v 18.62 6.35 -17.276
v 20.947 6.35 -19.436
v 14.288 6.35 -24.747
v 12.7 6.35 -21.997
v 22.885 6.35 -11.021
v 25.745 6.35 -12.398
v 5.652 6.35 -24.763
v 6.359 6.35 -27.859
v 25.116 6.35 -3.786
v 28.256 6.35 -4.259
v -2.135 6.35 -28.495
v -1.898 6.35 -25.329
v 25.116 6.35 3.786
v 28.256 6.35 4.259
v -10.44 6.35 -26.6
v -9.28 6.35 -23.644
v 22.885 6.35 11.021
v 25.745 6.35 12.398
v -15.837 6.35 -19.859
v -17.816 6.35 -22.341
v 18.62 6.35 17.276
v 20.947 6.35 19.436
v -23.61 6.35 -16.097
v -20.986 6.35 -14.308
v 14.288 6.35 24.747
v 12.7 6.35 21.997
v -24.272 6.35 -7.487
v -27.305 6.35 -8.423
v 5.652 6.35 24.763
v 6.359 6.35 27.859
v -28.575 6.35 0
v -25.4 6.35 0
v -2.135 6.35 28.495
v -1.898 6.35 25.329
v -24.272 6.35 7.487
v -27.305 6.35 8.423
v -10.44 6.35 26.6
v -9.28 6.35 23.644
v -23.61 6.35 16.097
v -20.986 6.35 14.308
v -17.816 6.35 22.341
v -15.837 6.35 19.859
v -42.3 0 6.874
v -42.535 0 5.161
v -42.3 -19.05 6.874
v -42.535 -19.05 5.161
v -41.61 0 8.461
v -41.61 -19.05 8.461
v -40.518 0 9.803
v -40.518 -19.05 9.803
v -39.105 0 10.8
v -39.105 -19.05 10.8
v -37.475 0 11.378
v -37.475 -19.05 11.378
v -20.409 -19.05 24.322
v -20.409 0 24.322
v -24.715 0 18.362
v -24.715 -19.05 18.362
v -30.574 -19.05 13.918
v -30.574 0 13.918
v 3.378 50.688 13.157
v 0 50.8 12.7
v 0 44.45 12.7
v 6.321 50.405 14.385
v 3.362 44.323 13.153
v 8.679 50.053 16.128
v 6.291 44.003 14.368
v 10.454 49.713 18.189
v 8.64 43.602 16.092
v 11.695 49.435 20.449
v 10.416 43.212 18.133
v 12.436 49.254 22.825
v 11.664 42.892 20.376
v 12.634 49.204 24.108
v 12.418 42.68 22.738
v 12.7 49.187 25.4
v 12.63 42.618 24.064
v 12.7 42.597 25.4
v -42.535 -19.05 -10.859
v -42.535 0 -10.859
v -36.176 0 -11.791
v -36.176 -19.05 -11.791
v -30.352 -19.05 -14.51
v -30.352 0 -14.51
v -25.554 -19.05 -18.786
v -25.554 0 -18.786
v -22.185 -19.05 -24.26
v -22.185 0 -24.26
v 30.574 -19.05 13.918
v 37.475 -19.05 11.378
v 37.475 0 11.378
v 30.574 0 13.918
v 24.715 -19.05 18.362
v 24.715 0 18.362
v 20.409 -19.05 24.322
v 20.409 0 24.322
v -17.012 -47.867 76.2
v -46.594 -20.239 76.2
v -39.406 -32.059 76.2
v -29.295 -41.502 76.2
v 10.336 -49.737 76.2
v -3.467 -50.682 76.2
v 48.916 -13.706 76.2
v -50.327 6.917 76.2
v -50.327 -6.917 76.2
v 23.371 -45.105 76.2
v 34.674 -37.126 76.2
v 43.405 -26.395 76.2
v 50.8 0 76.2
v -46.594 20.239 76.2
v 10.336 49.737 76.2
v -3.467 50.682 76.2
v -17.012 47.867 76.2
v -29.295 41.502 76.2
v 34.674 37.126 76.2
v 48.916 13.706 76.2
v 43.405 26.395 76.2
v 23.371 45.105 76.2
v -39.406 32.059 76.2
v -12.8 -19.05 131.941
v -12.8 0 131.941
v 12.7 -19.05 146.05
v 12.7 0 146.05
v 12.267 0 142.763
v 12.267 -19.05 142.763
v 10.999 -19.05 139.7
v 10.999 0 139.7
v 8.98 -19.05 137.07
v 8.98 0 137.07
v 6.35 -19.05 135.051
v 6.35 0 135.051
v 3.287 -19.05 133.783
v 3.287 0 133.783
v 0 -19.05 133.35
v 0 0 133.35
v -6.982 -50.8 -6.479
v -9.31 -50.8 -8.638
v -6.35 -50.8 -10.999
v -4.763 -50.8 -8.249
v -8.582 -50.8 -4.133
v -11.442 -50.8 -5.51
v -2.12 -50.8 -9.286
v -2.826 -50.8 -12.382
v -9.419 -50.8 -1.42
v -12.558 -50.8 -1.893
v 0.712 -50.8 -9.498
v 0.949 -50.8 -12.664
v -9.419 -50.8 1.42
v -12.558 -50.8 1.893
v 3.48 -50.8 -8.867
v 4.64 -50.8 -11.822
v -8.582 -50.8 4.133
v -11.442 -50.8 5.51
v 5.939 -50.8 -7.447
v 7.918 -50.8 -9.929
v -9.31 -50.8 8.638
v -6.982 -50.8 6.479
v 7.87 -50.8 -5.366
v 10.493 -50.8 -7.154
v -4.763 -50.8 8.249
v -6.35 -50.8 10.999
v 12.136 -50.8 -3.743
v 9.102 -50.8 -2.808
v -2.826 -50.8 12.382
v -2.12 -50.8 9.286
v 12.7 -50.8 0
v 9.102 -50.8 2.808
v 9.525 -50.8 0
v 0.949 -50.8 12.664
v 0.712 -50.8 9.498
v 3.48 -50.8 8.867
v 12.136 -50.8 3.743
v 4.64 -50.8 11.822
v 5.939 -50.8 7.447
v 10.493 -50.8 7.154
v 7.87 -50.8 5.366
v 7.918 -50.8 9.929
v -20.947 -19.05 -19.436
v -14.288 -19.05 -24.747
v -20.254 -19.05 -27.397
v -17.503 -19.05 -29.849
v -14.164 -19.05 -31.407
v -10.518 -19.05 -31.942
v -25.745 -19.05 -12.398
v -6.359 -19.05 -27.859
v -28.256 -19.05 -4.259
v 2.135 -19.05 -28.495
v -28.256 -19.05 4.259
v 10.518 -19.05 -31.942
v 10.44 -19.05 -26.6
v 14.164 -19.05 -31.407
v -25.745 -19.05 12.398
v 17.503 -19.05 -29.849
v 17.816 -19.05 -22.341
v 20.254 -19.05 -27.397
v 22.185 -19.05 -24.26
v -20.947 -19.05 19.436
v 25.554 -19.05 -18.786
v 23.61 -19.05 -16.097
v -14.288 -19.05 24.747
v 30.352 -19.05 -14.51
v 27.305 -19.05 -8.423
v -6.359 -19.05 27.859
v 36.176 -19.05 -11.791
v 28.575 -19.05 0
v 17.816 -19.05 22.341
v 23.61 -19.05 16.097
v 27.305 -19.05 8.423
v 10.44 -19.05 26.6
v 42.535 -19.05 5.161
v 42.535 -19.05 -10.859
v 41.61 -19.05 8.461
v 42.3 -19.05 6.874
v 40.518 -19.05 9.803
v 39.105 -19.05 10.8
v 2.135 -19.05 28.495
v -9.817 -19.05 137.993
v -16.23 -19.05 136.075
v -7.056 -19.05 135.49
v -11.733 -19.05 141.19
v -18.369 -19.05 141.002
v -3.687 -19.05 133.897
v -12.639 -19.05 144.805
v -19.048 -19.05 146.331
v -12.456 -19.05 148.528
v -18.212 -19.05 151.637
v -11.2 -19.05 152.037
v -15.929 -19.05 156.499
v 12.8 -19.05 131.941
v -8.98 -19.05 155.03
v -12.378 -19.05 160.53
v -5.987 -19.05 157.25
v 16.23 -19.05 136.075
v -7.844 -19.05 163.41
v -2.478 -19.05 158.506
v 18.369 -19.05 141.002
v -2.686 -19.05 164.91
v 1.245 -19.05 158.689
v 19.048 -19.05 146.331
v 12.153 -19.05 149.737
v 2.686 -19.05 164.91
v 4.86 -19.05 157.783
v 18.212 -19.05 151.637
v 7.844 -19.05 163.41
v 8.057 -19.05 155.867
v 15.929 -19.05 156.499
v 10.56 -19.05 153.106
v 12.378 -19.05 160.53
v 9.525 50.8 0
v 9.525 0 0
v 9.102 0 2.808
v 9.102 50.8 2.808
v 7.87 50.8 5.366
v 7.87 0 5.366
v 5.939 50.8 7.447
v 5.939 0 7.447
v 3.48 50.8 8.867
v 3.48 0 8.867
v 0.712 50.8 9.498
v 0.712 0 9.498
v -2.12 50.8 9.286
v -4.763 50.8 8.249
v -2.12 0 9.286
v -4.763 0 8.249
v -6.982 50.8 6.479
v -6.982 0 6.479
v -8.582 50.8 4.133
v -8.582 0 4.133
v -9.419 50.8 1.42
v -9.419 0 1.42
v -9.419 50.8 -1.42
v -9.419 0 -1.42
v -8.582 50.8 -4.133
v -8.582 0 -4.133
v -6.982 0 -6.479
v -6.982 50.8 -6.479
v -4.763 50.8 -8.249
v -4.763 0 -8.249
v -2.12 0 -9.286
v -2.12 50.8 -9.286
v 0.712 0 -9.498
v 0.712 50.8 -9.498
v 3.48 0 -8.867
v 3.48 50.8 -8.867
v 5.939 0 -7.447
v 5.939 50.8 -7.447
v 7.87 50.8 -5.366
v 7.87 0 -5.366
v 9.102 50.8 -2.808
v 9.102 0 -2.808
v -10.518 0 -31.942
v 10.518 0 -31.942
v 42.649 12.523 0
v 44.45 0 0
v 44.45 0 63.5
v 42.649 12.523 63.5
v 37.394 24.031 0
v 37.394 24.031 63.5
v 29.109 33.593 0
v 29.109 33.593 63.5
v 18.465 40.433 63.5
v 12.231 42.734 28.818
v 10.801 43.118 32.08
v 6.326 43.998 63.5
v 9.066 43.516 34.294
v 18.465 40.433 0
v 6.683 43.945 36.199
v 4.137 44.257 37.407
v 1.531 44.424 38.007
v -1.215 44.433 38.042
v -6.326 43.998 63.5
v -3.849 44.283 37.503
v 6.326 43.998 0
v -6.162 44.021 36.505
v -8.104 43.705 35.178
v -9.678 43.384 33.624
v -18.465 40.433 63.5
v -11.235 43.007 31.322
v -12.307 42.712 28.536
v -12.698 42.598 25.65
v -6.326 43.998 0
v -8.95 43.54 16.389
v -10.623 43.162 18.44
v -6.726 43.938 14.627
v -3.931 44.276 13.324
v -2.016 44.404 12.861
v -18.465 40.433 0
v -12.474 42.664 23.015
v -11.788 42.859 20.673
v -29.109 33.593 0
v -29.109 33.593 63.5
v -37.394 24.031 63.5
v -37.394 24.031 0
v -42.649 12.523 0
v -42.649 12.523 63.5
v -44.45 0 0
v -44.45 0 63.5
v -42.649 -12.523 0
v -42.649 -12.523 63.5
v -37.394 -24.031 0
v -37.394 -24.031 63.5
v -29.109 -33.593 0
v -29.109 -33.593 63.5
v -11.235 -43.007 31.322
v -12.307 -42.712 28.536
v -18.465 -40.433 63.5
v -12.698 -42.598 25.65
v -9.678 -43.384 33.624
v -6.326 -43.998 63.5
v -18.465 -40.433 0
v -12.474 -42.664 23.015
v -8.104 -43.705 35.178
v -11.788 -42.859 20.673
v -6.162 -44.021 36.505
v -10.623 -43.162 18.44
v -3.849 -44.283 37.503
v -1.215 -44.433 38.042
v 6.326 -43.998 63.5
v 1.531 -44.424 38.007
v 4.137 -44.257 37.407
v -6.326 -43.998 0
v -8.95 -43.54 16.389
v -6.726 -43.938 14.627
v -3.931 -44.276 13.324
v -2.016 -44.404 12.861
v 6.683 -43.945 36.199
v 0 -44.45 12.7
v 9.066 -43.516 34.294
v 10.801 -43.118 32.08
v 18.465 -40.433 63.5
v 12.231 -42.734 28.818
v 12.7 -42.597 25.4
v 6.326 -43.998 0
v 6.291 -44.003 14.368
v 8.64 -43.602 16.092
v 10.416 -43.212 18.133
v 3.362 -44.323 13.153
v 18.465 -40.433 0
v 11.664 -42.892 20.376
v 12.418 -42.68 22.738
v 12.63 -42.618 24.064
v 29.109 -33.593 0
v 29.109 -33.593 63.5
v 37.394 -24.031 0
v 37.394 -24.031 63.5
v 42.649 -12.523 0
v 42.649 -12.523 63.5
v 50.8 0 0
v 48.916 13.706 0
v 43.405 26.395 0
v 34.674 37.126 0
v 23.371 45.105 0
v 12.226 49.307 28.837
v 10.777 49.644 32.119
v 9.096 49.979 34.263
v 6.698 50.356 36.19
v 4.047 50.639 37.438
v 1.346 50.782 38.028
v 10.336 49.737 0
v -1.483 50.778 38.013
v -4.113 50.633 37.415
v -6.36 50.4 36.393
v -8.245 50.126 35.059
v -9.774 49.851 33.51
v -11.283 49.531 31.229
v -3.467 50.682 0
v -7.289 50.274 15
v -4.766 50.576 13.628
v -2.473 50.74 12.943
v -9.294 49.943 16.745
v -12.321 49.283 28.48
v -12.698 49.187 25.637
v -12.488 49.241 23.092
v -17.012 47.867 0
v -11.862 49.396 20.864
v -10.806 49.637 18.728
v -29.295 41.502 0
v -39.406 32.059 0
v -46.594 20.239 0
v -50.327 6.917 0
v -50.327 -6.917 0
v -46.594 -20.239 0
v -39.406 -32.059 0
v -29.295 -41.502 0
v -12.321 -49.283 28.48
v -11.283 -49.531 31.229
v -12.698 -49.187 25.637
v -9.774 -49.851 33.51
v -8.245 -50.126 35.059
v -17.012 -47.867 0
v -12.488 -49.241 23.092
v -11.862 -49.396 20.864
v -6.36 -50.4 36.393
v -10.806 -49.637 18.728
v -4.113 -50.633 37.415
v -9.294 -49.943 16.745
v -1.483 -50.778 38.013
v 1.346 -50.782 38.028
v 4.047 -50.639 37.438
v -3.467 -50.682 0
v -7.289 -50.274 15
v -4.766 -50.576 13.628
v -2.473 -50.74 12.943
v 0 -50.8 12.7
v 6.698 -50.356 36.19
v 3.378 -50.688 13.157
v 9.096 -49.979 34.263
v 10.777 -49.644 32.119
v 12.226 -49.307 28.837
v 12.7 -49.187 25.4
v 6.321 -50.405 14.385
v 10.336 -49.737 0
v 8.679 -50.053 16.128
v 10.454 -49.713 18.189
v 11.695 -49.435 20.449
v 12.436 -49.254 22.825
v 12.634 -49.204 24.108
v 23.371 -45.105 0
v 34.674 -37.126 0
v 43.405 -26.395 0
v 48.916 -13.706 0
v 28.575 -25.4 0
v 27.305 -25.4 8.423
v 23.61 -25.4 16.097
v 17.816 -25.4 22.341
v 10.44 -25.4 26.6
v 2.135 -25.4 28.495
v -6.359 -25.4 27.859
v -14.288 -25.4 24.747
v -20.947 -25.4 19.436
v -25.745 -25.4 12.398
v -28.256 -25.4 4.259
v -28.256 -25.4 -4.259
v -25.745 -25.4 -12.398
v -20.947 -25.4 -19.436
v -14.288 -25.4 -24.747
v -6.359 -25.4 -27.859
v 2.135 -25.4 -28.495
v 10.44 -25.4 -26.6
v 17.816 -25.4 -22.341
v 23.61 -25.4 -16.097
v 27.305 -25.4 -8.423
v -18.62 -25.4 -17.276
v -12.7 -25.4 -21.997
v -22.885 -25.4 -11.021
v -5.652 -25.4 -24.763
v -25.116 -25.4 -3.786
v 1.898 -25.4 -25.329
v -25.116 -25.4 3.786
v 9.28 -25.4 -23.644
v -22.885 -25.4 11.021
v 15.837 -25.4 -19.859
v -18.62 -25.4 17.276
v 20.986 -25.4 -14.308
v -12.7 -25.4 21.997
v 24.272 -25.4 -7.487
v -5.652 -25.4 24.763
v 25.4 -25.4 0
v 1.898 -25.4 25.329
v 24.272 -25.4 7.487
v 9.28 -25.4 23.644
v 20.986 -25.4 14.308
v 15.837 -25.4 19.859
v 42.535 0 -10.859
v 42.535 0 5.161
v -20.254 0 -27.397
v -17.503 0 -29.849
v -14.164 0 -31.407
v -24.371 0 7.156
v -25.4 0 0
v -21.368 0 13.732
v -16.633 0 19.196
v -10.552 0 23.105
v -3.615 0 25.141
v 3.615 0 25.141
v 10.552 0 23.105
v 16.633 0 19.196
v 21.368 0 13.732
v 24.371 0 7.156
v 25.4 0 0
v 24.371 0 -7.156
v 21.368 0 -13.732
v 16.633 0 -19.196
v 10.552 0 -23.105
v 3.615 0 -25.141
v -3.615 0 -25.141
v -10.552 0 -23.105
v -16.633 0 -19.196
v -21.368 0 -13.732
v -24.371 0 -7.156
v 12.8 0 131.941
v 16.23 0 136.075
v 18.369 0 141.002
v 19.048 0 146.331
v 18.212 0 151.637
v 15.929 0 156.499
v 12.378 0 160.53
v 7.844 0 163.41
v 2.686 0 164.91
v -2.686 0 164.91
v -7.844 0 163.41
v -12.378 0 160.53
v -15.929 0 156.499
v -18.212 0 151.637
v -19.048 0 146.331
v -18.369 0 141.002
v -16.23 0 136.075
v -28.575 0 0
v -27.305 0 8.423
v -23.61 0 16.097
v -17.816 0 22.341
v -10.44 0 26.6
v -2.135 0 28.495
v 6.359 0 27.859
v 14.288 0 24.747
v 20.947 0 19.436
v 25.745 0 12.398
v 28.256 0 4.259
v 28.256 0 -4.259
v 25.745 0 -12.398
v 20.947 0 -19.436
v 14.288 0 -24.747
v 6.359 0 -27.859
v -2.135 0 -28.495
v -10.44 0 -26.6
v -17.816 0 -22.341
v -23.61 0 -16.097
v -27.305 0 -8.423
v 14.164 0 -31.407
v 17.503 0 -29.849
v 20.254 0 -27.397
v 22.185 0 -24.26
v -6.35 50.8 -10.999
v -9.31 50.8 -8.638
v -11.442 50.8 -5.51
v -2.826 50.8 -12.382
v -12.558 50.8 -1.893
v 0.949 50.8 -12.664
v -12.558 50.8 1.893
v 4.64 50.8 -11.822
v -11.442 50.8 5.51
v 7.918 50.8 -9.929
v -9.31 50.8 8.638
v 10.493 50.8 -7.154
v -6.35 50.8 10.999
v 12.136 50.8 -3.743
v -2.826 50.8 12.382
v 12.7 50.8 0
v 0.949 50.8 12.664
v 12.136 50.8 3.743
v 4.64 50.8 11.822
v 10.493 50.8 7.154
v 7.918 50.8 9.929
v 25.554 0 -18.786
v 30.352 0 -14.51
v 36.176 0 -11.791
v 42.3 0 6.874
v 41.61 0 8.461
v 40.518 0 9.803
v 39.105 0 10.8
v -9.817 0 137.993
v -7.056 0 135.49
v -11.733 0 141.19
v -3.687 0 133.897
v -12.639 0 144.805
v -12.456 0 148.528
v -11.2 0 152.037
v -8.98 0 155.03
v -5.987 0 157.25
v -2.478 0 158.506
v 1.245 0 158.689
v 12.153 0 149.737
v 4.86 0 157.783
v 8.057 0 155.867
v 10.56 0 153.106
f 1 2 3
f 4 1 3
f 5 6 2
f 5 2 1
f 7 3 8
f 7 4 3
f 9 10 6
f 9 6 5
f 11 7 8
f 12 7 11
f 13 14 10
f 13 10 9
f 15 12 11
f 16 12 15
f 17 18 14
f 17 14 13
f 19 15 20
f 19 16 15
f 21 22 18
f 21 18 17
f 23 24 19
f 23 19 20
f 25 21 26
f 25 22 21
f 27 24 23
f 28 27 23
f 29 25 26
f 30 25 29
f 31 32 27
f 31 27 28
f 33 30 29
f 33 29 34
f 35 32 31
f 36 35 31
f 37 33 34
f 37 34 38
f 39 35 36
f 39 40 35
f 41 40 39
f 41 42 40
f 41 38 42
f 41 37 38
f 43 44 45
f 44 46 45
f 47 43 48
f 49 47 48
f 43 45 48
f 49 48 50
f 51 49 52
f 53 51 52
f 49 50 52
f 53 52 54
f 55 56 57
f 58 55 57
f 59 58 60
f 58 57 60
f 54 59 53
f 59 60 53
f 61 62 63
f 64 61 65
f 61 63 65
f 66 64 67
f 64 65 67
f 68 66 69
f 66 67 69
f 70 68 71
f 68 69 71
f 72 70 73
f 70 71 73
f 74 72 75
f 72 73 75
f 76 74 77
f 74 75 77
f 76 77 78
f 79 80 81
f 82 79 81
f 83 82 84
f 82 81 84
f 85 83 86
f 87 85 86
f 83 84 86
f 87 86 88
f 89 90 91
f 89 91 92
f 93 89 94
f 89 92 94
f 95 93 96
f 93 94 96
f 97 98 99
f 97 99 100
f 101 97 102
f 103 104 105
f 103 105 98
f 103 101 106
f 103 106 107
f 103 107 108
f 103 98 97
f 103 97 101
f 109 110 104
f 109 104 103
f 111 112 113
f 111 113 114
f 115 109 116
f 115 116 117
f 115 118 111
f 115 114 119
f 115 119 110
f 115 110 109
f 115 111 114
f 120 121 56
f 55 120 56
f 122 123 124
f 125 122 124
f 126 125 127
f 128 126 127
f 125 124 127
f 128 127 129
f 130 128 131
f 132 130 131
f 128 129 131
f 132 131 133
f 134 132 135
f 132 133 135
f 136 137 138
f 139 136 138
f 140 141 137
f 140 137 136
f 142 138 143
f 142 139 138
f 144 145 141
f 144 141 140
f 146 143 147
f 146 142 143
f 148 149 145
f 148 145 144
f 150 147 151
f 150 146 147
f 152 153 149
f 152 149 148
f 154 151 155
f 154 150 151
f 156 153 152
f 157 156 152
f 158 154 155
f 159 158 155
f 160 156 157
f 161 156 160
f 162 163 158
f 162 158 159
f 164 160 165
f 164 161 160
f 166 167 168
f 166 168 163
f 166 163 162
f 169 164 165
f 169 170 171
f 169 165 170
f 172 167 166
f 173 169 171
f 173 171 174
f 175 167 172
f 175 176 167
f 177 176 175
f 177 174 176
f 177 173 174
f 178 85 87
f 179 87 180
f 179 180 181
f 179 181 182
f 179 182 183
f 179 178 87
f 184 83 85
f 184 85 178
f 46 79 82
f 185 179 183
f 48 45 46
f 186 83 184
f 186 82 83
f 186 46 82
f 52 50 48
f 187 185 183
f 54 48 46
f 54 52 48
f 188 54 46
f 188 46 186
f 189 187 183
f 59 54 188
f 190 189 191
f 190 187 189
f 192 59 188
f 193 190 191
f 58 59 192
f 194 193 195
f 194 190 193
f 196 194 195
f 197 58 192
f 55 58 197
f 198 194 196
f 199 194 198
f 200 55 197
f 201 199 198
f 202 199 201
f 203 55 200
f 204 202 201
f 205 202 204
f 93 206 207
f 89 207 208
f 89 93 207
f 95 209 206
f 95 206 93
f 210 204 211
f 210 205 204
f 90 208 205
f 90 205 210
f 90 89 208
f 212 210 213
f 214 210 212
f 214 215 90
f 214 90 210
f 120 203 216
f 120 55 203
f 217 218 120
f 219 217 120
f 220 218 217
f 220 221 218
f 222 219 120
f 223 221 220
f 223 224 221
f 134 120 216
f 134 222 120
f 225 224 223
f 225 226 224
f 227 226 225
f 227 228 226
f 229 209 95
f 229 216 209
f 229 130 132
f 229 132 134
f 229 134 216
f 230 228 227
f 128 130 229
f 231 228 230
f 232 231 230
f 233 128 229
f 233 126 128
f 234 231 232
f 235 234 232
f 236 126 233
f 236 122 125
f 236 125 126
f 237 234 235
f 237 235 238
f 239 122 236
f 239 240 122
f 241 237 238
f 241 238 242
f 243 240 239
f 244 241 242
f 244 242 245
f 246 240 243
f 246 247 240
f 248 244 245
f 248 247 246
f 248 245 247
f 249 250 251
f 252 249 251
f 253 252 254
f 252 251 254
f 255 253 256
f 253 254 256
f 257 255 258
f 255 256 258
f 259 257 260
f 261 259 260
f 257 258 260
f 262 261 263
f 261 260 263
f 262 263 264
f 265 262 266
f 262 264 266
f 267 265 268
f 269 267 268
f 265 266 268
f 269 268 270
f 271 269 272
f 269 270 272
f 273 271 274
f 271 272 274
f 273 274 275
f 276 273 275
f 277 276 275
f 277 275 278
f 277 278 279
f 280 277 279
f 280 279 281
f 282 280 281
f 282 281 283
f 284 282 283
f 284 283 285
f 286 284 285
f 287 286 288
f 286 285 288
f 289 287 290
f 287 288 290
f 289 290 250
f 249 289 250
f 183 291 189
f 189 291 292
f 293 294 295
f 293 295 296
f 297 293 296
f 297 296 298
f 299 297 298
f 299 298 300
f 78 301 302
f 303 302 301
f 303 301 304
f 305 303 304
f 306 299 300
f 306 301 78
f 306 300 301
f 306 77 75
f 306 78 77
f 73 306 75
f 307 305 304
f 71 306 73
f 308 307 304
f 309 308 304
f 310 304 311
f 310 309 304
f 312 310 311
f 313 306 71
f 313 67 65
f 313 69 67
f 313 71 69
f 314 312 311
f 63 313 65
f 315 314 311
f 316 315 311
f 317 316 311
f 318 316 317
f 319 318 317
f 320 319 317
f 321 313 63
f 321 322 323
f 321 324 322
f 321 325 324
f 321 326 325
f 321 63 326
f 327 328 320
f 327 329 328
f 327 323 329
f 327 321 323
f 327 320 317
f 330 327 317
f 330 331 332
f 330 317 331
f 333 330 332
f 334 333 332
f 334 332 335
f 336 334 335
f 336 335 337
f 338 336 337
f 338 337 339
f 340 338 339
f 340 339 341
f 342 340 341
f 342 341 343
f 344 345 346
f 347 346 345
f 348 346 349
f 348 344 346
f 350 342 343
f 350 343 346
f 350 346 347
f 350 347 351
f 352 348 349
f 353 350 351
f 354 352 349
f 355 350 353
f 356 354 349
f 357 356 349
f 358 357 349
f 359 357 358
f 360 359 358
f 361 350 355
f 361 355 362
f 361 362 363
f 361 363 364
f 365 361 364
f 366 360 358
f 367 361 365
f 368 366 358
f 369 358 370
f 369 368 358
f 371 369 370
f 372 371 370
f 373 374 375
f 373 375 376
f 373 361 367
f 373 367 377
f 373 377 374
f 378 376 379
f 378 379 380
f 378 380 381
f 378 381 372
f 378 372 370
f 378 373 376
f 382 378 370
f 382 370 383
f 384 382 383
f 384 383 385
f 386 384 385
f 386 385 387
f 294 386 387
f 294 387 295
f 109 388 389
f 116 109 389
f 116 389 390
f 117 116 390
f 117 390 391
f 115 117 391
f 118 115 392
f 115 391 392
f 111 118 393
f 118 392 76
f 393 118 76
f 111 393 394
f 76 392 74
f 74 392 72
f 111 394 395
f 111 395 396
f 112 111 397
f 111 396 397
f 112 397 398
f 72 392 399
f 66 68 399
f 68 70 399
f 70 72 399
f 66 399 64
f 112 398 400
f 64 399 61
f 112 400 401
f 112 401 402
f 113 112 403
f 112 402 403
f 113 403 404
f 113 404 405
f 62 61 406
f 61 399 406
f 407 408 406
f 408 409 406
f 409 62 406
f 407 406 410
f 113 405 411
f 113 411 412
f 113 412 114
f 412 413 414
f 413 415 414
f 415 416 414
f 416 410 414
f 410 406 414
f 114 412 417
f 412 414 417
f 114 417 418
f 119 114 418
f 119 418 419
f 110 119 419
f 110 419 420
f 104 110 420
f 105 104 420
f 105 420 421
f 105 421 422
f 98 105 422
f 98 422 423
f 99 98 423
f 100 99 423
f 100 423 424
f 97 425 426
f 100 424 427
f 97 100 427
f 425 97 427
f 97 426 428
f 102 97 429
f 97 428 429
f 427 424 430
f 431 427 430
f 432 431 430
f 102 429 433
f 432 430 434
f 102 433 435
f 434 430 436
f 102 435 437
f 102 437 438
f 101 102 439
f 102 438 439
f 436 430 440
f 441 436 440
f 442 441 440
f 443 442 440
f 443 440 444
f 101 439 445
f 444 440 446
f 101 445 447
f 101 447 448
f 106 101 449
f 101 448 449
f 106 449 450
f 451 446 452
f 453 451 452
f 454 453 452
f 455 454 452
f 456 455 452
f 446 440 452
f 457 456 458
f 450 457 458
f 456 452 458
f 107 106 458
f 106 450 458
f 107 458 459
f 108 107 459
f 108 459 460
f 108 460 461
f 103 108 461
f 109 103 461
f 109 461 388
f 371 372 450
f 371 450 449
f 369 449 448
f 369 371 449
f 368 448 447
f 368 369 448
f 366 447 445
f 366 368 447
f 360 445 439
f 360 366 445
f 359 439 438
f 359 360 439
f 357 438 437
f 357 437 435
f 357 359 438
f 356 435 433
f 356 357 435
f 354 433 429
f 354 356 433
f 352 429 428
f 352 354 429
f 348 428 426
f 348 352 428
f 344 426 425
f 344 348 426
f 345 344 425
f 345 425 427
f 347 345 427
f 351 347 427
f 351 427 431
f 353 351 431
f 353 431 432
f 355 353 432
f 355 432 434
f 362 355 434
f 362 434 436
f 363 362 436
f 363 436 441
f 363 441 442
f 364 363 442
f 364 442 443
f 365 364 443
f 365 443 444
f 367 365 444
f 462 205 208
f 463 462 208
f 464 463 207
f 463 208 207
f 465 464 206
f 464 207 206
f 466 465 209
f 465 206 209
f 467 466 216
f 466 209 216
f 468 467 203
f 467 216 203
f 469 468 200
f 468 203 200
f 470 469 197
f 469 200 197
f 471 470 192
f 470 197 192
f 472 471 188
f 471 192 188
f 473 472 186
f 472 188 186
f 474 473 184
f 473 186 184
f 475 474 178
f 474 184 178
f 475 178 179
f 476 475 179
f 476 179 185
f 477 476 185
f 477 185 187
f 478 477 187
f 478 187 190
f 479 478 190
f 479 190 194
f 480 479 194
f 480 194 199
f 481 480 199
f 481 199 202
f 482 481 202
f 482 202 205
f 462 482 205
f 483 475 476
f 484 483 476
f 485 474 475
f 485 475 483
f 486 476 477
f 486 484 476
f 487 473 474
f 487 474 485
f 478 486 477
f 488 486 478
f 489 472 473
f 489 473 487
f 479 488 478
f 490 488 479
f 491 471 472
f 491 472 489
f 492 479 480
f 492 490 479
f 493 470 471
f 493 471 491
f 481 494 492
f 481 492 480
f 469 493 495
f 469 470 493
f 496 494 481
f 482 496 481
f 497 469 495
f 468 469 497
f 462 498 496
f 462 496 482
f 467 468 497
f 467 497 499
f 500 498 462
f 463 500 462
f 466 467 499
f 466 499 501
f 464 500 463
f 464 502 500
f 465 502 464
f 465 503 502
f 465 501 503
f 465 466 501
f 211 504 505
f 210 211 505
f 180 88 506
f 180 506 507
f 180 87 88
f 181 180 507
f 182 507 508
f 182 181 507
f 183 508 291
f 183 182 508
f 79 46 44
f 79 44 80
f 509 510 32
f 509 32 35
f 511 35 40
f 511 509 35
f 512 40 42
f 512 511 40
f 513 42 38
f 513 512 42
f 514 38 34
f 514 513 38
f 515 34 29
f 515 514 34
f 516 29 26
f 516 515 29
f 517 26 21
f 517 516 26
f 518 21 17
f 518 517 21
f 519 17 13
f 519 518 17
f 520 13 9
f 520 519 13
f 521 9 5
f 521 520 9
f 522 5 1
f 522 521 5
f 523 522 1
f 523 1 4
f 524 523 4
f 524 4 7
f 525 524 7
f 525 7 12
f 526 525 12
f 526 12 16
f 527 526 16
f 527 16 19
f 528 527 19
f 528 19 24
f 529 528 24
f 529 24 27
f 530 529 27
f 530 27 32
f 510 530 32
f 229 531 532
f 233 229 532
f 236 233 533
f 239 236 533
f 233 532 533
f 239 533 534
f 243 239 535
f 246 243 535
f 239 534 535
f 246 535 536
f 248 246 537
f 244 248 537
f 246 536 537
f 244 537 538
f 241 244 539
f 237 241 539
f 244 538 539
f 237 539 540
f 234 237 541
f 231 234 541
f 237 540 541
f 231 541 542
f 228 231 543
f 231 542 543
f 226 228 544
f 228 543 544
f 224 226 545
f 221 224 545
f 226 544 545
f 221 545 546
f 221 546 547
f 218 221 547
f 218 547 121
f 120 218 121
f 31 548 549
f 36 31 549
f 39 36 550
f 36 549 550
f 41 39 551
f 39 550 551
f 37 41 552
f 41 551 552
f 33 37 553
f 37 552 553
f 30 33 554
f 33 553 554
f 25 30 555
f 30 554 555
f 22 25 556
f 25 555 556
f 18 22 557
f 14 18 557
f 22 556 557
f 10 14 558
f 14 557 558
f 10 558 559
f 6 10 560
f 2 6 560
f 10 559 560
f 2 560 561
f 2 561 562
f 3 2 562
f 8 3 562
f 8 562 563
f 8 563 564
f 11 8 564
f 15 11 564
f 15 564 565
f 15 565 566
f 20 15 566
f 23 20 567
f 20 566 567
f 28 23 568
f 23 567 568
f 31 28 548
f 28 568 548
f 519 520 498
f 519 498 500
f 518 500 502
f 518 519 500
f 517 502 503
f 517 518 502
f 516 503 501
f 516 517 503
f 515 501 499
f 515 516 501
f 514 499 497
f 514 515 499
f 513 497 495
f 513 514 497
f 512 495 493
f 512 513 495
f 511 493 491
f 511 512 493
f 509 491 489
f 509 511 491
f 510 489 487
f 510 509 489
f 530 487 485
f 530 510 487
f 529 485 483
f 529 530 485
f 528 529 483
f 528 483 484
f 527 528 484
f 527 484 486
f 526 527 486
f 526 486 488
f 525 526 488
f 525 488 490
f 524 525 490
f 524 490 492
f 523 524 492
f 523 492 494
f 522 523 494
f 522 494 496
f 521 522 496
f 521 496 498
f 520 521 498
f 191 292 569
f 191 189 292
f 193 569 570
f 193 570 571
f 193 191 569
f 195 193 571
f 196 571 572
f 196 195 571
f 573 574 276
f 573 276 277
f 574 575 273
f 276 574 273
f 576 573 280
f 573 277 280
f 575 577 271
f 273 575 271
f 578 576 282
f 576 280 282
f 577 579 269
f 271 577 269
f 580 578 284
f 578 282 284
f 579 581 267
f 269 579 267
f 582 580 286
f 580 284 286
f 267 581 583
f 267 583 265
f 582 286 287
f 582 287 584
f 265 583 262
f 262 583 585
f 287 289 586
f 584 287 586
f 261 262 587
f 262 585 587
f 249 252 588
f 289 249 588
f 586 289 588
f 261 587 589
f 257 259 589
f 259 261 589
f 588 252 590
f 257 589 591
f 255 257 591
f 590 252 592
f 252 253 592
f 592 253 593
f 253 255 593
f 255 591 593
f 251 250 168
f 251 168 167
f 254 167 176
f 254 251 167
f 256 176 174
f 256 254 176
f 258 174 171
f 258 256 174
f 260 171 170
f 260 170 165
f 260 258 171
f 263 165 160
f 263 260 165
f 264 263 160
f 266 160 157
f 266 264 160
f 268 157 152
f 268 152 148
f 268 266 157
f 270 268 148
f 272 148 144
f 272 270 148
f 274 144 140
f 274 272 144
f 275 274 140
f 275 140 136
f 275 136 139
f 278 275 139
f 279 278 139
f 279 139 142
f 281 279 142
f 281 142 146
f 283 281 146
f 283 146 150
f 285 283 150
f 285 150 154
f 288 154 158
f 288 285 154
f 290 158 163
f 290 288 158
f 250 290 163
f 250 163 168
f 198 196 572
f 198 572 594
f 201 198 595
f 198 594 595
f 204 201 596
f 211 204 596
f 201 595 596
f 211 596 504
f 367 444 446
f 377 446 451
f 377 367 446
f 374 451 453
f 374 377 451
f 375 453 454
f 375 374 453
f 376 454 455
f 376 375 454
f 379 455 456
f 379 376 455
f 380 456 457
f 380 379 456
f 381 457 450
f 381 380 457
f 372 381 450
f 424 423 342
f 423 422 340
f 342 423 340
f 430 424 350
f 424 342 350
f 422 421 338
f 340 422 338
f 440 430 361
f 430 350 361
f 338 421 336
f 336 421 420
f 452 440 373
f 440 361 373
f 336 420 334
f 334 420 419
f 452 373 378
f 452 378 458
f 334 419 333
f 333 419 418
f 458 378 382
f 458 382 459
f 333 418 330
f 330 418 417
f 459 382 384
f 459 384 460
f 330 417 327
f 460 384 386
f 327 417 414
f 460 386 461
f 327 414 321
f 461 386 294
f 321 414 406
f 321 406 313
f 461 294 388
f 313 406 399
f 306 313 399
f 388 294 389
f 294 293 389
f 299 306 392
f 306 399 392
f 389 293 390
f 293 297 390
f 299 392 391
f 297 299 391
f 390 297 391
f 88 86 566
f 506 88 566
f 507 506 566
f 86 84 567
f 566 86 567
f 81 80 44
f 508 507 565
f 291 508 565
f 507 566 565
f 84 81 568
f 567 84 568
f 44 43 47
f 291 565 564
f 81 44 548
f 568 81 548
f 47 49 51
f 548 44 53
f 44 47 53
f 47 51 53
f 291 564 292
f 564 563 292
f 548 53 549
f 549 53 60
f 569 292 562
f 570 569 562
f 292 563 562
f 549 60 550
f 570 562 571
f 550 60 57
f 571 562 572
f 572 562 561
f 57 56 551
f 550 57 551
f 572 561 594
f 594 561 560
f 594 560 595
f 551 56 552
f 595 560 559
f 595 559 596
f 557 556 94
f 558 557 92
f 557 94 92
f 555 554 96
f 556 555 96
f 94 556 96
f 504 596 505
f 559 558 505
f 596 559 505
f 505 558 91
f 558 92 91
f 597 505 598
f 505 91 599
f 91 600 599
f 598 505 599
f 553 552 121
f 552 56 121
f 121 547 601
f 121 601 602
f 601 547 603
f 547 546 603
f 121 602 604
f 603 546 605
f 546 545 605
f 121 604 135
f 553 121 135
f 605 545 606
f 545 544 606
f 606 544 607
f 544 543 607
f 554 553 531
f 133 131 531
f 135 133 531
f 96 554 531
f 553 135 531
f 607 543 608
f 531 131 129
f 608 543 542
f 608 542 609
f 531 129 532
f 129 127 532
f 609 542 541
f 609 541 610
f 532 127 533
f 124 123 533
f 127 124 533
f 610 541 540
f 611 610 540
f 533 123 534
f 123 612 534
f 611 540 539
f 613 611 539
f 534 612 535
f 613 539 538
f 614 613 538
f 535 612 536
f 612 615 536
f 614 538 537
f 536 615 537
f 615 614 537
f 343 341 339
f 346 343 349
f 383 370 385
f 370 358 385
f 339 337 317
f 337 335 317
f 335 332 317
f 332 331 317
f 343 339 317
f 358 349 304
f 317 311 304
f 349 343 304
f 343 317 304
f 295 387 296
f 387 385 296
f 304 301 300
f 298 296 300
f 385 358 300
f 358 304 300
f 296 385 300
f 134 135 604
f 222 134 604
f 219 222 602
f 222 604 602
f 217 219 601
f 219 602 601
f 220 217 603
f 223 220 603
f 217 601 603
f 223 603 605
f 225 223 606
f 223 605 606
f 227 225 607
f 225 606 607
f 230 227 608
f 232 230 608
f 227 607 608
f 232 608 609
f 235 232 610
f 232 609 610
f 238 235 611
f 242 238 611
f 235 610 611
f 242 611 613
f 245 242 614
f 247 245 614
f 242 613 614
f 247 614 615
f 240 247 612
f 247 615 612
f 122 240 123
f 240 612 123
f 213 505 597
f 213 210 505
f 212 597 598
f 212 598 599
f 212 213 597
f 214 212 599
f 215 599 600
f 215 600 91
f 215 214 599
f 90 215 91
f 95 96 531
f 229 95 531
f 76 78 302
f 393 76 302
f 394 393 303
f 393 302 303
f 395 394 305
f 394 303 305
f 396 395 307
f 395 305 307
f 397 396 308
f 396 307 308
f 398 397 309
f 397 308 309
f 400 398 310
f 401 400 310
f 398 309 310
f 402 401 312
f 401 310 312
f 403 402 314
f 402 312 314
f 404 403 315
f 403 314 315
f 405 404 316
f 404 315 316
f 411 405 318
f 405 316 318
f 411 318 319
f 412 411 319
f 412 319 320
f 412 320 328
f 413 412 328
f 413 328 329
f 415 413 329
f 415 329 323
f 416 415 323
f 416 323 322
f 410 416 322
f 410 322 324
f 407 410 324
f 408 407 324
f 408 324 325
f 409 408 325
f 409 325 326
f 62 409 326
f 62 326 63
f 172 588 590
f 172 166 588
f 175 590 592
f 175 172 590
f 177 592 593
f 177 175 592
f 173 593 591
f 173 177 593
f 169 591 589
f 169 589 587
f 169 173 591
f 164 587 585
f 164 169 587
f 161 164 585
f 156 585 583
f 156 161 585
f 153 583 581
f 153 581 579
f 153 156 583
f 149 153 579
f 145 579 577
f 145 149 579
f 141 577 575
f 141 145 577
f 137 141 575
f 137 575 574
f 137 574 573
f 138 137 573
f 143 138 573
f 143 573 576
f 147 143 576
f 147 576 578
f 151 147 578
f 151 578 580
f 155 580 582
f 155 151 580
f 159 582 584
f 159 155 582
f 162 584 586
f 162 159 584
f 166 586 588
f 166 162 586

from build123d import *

# Parameters (mm, degrees)
F1_DEPTH       = 19.05
F2_R           = 28.575
F2_R_2         = 25.4
F3_DEPTH       = 25.4
F4_R           = 28.575
F4_R_2         = 25.4
F5_DEPTH       = 6.35
F6_R           = 12.7
F7_R           = 6.35
F8_R           = 12.7
F8_R_2         = 9.525
F9_DEPTH       = 50.8
F9_DEPTH_BACK  = 50.8
F10_R          = 50.8
F10_R_2        = 44.45
F11_DEPTH      = 76.2
F12_R          = 50.8
F13_DEPTH      = 12.7
F15_DEPTH      = 72.136
F15_DEPTH_BACK = 101.346


with BuildPart() as f1:
    # F0 (on Front) → F1 (new body)
    with BuildSketch(Plane.XZ):
        with BuildLine():
            Line((-12.7996388564, 131.9407213102), (-20.4085066075, 24.321911069))
            ThreePointArc((-20.4085066075, 24.321911069), (-29.5849648539, 14.4892969079), (-42.53524071, 10.8591395506))
            Line((-42.53524071, 10.8591395506), (-42.53524071, -10.8591395506))
            ThreePointArc((-42.53524071, -10.8591395506), (-27.2539153671, -16.9737049796), (-20.4085066075, -31.941911069))
            Line((-20.4085066075, -31.941911069), (20.4085066075, -31.941911069))
            ThreePointArc((20.4085066075, -31.941911069), (27.2539153671, -16.9737049796), (42.53524071, -10.8591395506))
            Line((42.53524071, -10.8591395506), (42.53524071, 10.8591395506))
            ThreePointArc((42.53524071, 10.8591395506), (29.5849648539, 14.4892969079), (20.4085066075, 24.321911069))
            Line((20.4085066075, 24.321911069), (12.7996388564, 131.9407213102))
            ThreePointArc((12.7996388564, 131.9407213102), (0, 165.1), (-12.7996388564, 131.9407213102))
        make_face()
        with BuildLine():
            ThreePointArc((0, -28.575), (-20.2055762724, 20.2055762724), (28.575, 0))
            ThreePointArc((28.575, 0), (20.2055762724, -20.2055762724), (0, -28.575))
        make_face(mode=Mode.SUBTRACT)
        with BuildLine():
            ThreePointArc((0, 133.35), (-8.9802561211, 155.0302561211), (12.7, 146.05))
            ThreePointArc((12.7, 146.05), (8.9802561211, 137.0697438789), (0, 133.35))
        make_face(mode=Mode.SUBTRACT)
    extrude(amount=F1_DEPTH)

    # F2 (on Front) → F3 (join)
    with BuildSketch(Plane.XZ):
        Circle(F2_R)
        Circle(F2_R_2, mode=Mode.SUBTRACT)
    extrude(amount=F3_DEPTH)

    # F4 (on face) → F5 (join)
    with BuildSketch(Plane(origin=(0, 0, 0), x_dir=(-1, 0, 0), z_dir=(0, 1, 0))):
        Circle(F4_R)
        Circle(F4_R_2, mode=Mode.SUBTRACT)
    extrude(amount=F5_DEPTH)

    # F6
    f6_edges = [f1.edges().sort_by_distance(p)[0] for p in [
        (20.408507, -9.525, -31.941911),
        (-20.408507, -9.525, -31.941911),
    ]]
    fillet(f6_edges, radius=F6_R)

    # F7
    f7_edges = [f1.edges().sort_by_distance(p)[0] for p in [
        (42.535241, -9.525, 10.85914),
        (-42.535241, -9.525, 10.85914),
    ]]
    fillet(f7_edges, radius=F7_R)


with BuildPart() as f9:
    # F8 (on Front) → F9 (new body, two sides)
    with BuildSketch(Plane.XZ) as f9_sk:
        Circle(F8_R)
        Circle(F8_R_2, mode=Mode.SUBTRACT)
    extrude(amount=F9_DEPTH)
    extrude(f9_sk.sketch, amount=-F9_DEPTH_BACK)


with BuildPart() as f11:
    # F10 (on Top) → F11 (new body)
    with BuildSketch(Plane.XY):
        Circle(F10_R)
        Circle(F10_R_2, mode=Mode.SUBTRACT)
    extrude(amount=F11_DEPTH)

    # F12 (on face) → F13 (join)
    with BuildSketch(Plane.XY.offset(76.2)):
        Circle(F12_R)
    extrude(amount=-F13_DEPTH)

    # F14 (on Front) → F15 (cut, two sides)
    with BuildSketch(Plane.XZ) as f15_sk:
        with BuildLine():
            ThreePointArc((0, 12.7), (8.9802561211, 16.4197438789), (12.7, 25.4))
            ThreePointArc((12.7, 25.4), (-8.9802561211, 34.3802561211), (0, 12.7))
        make_face()
    extrude(amount=-F15_DEPTH, mode=Mode.SUBTRACT)
    extrude(f15_sk.sketch, amount=F15_DEPTH_BACK, mode=Mode.SUBTRACT)


solid = Compound([f1.part, f9.part, f11.part])
